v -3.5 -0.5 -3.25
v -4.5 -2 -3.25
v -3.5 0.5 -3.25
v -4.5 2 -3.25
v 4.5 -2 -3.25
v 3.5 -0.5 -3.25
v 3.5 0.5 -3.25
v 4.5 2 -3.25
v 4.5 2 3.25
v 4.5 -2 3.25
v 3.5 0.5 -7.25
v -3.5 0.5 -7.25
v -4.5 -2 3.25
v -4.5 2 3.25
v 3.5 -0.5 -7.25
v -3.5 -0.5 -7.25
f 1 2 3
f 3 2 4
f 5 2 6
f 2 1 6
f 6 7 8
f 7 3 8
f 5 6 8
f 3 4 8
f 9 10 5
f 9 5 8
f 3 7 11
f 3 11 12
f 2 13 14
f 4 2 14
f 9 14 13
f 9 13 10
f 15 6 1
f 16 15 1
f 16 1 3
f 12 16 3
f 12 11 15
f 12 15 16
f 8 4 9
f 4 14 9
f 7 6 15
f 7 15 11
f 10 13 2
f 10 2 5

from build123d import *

# Parameters (mm, degrees)
SKETCH1_W           = 9
SKETCH1_H           = 4
BOSS_EXTRUDE1_DEPTH = 3.25
SKETCH2_W           = 7
SKETCH2_H           = 1
BOSS_EXTRUDE2_DEPTH = 4


with BuildPart() as part:
    # Sketch1 → Boss-Extrude1 (new, symmetric)
    with BuildSketch(Plane.XY):
        Rectangle(SKETCH1_W, SKETCH1_H)
    extrude(amount=BOSS_EXTRUDE1_DEPTH, both=True)

    # Sketch2 → Boss-Extrude2 (add)
    with BuildSketch(Plane(origin=(0, 0, -3.25), x_dir=(-1, 0, 0), z_dir=(0, 0, -1))):
        Rectangle(SKETCH2_W, SKETCH2_H)
    extrude(amount=BOSS_EXTRUDE2_DEPTH)


solid = part.part
